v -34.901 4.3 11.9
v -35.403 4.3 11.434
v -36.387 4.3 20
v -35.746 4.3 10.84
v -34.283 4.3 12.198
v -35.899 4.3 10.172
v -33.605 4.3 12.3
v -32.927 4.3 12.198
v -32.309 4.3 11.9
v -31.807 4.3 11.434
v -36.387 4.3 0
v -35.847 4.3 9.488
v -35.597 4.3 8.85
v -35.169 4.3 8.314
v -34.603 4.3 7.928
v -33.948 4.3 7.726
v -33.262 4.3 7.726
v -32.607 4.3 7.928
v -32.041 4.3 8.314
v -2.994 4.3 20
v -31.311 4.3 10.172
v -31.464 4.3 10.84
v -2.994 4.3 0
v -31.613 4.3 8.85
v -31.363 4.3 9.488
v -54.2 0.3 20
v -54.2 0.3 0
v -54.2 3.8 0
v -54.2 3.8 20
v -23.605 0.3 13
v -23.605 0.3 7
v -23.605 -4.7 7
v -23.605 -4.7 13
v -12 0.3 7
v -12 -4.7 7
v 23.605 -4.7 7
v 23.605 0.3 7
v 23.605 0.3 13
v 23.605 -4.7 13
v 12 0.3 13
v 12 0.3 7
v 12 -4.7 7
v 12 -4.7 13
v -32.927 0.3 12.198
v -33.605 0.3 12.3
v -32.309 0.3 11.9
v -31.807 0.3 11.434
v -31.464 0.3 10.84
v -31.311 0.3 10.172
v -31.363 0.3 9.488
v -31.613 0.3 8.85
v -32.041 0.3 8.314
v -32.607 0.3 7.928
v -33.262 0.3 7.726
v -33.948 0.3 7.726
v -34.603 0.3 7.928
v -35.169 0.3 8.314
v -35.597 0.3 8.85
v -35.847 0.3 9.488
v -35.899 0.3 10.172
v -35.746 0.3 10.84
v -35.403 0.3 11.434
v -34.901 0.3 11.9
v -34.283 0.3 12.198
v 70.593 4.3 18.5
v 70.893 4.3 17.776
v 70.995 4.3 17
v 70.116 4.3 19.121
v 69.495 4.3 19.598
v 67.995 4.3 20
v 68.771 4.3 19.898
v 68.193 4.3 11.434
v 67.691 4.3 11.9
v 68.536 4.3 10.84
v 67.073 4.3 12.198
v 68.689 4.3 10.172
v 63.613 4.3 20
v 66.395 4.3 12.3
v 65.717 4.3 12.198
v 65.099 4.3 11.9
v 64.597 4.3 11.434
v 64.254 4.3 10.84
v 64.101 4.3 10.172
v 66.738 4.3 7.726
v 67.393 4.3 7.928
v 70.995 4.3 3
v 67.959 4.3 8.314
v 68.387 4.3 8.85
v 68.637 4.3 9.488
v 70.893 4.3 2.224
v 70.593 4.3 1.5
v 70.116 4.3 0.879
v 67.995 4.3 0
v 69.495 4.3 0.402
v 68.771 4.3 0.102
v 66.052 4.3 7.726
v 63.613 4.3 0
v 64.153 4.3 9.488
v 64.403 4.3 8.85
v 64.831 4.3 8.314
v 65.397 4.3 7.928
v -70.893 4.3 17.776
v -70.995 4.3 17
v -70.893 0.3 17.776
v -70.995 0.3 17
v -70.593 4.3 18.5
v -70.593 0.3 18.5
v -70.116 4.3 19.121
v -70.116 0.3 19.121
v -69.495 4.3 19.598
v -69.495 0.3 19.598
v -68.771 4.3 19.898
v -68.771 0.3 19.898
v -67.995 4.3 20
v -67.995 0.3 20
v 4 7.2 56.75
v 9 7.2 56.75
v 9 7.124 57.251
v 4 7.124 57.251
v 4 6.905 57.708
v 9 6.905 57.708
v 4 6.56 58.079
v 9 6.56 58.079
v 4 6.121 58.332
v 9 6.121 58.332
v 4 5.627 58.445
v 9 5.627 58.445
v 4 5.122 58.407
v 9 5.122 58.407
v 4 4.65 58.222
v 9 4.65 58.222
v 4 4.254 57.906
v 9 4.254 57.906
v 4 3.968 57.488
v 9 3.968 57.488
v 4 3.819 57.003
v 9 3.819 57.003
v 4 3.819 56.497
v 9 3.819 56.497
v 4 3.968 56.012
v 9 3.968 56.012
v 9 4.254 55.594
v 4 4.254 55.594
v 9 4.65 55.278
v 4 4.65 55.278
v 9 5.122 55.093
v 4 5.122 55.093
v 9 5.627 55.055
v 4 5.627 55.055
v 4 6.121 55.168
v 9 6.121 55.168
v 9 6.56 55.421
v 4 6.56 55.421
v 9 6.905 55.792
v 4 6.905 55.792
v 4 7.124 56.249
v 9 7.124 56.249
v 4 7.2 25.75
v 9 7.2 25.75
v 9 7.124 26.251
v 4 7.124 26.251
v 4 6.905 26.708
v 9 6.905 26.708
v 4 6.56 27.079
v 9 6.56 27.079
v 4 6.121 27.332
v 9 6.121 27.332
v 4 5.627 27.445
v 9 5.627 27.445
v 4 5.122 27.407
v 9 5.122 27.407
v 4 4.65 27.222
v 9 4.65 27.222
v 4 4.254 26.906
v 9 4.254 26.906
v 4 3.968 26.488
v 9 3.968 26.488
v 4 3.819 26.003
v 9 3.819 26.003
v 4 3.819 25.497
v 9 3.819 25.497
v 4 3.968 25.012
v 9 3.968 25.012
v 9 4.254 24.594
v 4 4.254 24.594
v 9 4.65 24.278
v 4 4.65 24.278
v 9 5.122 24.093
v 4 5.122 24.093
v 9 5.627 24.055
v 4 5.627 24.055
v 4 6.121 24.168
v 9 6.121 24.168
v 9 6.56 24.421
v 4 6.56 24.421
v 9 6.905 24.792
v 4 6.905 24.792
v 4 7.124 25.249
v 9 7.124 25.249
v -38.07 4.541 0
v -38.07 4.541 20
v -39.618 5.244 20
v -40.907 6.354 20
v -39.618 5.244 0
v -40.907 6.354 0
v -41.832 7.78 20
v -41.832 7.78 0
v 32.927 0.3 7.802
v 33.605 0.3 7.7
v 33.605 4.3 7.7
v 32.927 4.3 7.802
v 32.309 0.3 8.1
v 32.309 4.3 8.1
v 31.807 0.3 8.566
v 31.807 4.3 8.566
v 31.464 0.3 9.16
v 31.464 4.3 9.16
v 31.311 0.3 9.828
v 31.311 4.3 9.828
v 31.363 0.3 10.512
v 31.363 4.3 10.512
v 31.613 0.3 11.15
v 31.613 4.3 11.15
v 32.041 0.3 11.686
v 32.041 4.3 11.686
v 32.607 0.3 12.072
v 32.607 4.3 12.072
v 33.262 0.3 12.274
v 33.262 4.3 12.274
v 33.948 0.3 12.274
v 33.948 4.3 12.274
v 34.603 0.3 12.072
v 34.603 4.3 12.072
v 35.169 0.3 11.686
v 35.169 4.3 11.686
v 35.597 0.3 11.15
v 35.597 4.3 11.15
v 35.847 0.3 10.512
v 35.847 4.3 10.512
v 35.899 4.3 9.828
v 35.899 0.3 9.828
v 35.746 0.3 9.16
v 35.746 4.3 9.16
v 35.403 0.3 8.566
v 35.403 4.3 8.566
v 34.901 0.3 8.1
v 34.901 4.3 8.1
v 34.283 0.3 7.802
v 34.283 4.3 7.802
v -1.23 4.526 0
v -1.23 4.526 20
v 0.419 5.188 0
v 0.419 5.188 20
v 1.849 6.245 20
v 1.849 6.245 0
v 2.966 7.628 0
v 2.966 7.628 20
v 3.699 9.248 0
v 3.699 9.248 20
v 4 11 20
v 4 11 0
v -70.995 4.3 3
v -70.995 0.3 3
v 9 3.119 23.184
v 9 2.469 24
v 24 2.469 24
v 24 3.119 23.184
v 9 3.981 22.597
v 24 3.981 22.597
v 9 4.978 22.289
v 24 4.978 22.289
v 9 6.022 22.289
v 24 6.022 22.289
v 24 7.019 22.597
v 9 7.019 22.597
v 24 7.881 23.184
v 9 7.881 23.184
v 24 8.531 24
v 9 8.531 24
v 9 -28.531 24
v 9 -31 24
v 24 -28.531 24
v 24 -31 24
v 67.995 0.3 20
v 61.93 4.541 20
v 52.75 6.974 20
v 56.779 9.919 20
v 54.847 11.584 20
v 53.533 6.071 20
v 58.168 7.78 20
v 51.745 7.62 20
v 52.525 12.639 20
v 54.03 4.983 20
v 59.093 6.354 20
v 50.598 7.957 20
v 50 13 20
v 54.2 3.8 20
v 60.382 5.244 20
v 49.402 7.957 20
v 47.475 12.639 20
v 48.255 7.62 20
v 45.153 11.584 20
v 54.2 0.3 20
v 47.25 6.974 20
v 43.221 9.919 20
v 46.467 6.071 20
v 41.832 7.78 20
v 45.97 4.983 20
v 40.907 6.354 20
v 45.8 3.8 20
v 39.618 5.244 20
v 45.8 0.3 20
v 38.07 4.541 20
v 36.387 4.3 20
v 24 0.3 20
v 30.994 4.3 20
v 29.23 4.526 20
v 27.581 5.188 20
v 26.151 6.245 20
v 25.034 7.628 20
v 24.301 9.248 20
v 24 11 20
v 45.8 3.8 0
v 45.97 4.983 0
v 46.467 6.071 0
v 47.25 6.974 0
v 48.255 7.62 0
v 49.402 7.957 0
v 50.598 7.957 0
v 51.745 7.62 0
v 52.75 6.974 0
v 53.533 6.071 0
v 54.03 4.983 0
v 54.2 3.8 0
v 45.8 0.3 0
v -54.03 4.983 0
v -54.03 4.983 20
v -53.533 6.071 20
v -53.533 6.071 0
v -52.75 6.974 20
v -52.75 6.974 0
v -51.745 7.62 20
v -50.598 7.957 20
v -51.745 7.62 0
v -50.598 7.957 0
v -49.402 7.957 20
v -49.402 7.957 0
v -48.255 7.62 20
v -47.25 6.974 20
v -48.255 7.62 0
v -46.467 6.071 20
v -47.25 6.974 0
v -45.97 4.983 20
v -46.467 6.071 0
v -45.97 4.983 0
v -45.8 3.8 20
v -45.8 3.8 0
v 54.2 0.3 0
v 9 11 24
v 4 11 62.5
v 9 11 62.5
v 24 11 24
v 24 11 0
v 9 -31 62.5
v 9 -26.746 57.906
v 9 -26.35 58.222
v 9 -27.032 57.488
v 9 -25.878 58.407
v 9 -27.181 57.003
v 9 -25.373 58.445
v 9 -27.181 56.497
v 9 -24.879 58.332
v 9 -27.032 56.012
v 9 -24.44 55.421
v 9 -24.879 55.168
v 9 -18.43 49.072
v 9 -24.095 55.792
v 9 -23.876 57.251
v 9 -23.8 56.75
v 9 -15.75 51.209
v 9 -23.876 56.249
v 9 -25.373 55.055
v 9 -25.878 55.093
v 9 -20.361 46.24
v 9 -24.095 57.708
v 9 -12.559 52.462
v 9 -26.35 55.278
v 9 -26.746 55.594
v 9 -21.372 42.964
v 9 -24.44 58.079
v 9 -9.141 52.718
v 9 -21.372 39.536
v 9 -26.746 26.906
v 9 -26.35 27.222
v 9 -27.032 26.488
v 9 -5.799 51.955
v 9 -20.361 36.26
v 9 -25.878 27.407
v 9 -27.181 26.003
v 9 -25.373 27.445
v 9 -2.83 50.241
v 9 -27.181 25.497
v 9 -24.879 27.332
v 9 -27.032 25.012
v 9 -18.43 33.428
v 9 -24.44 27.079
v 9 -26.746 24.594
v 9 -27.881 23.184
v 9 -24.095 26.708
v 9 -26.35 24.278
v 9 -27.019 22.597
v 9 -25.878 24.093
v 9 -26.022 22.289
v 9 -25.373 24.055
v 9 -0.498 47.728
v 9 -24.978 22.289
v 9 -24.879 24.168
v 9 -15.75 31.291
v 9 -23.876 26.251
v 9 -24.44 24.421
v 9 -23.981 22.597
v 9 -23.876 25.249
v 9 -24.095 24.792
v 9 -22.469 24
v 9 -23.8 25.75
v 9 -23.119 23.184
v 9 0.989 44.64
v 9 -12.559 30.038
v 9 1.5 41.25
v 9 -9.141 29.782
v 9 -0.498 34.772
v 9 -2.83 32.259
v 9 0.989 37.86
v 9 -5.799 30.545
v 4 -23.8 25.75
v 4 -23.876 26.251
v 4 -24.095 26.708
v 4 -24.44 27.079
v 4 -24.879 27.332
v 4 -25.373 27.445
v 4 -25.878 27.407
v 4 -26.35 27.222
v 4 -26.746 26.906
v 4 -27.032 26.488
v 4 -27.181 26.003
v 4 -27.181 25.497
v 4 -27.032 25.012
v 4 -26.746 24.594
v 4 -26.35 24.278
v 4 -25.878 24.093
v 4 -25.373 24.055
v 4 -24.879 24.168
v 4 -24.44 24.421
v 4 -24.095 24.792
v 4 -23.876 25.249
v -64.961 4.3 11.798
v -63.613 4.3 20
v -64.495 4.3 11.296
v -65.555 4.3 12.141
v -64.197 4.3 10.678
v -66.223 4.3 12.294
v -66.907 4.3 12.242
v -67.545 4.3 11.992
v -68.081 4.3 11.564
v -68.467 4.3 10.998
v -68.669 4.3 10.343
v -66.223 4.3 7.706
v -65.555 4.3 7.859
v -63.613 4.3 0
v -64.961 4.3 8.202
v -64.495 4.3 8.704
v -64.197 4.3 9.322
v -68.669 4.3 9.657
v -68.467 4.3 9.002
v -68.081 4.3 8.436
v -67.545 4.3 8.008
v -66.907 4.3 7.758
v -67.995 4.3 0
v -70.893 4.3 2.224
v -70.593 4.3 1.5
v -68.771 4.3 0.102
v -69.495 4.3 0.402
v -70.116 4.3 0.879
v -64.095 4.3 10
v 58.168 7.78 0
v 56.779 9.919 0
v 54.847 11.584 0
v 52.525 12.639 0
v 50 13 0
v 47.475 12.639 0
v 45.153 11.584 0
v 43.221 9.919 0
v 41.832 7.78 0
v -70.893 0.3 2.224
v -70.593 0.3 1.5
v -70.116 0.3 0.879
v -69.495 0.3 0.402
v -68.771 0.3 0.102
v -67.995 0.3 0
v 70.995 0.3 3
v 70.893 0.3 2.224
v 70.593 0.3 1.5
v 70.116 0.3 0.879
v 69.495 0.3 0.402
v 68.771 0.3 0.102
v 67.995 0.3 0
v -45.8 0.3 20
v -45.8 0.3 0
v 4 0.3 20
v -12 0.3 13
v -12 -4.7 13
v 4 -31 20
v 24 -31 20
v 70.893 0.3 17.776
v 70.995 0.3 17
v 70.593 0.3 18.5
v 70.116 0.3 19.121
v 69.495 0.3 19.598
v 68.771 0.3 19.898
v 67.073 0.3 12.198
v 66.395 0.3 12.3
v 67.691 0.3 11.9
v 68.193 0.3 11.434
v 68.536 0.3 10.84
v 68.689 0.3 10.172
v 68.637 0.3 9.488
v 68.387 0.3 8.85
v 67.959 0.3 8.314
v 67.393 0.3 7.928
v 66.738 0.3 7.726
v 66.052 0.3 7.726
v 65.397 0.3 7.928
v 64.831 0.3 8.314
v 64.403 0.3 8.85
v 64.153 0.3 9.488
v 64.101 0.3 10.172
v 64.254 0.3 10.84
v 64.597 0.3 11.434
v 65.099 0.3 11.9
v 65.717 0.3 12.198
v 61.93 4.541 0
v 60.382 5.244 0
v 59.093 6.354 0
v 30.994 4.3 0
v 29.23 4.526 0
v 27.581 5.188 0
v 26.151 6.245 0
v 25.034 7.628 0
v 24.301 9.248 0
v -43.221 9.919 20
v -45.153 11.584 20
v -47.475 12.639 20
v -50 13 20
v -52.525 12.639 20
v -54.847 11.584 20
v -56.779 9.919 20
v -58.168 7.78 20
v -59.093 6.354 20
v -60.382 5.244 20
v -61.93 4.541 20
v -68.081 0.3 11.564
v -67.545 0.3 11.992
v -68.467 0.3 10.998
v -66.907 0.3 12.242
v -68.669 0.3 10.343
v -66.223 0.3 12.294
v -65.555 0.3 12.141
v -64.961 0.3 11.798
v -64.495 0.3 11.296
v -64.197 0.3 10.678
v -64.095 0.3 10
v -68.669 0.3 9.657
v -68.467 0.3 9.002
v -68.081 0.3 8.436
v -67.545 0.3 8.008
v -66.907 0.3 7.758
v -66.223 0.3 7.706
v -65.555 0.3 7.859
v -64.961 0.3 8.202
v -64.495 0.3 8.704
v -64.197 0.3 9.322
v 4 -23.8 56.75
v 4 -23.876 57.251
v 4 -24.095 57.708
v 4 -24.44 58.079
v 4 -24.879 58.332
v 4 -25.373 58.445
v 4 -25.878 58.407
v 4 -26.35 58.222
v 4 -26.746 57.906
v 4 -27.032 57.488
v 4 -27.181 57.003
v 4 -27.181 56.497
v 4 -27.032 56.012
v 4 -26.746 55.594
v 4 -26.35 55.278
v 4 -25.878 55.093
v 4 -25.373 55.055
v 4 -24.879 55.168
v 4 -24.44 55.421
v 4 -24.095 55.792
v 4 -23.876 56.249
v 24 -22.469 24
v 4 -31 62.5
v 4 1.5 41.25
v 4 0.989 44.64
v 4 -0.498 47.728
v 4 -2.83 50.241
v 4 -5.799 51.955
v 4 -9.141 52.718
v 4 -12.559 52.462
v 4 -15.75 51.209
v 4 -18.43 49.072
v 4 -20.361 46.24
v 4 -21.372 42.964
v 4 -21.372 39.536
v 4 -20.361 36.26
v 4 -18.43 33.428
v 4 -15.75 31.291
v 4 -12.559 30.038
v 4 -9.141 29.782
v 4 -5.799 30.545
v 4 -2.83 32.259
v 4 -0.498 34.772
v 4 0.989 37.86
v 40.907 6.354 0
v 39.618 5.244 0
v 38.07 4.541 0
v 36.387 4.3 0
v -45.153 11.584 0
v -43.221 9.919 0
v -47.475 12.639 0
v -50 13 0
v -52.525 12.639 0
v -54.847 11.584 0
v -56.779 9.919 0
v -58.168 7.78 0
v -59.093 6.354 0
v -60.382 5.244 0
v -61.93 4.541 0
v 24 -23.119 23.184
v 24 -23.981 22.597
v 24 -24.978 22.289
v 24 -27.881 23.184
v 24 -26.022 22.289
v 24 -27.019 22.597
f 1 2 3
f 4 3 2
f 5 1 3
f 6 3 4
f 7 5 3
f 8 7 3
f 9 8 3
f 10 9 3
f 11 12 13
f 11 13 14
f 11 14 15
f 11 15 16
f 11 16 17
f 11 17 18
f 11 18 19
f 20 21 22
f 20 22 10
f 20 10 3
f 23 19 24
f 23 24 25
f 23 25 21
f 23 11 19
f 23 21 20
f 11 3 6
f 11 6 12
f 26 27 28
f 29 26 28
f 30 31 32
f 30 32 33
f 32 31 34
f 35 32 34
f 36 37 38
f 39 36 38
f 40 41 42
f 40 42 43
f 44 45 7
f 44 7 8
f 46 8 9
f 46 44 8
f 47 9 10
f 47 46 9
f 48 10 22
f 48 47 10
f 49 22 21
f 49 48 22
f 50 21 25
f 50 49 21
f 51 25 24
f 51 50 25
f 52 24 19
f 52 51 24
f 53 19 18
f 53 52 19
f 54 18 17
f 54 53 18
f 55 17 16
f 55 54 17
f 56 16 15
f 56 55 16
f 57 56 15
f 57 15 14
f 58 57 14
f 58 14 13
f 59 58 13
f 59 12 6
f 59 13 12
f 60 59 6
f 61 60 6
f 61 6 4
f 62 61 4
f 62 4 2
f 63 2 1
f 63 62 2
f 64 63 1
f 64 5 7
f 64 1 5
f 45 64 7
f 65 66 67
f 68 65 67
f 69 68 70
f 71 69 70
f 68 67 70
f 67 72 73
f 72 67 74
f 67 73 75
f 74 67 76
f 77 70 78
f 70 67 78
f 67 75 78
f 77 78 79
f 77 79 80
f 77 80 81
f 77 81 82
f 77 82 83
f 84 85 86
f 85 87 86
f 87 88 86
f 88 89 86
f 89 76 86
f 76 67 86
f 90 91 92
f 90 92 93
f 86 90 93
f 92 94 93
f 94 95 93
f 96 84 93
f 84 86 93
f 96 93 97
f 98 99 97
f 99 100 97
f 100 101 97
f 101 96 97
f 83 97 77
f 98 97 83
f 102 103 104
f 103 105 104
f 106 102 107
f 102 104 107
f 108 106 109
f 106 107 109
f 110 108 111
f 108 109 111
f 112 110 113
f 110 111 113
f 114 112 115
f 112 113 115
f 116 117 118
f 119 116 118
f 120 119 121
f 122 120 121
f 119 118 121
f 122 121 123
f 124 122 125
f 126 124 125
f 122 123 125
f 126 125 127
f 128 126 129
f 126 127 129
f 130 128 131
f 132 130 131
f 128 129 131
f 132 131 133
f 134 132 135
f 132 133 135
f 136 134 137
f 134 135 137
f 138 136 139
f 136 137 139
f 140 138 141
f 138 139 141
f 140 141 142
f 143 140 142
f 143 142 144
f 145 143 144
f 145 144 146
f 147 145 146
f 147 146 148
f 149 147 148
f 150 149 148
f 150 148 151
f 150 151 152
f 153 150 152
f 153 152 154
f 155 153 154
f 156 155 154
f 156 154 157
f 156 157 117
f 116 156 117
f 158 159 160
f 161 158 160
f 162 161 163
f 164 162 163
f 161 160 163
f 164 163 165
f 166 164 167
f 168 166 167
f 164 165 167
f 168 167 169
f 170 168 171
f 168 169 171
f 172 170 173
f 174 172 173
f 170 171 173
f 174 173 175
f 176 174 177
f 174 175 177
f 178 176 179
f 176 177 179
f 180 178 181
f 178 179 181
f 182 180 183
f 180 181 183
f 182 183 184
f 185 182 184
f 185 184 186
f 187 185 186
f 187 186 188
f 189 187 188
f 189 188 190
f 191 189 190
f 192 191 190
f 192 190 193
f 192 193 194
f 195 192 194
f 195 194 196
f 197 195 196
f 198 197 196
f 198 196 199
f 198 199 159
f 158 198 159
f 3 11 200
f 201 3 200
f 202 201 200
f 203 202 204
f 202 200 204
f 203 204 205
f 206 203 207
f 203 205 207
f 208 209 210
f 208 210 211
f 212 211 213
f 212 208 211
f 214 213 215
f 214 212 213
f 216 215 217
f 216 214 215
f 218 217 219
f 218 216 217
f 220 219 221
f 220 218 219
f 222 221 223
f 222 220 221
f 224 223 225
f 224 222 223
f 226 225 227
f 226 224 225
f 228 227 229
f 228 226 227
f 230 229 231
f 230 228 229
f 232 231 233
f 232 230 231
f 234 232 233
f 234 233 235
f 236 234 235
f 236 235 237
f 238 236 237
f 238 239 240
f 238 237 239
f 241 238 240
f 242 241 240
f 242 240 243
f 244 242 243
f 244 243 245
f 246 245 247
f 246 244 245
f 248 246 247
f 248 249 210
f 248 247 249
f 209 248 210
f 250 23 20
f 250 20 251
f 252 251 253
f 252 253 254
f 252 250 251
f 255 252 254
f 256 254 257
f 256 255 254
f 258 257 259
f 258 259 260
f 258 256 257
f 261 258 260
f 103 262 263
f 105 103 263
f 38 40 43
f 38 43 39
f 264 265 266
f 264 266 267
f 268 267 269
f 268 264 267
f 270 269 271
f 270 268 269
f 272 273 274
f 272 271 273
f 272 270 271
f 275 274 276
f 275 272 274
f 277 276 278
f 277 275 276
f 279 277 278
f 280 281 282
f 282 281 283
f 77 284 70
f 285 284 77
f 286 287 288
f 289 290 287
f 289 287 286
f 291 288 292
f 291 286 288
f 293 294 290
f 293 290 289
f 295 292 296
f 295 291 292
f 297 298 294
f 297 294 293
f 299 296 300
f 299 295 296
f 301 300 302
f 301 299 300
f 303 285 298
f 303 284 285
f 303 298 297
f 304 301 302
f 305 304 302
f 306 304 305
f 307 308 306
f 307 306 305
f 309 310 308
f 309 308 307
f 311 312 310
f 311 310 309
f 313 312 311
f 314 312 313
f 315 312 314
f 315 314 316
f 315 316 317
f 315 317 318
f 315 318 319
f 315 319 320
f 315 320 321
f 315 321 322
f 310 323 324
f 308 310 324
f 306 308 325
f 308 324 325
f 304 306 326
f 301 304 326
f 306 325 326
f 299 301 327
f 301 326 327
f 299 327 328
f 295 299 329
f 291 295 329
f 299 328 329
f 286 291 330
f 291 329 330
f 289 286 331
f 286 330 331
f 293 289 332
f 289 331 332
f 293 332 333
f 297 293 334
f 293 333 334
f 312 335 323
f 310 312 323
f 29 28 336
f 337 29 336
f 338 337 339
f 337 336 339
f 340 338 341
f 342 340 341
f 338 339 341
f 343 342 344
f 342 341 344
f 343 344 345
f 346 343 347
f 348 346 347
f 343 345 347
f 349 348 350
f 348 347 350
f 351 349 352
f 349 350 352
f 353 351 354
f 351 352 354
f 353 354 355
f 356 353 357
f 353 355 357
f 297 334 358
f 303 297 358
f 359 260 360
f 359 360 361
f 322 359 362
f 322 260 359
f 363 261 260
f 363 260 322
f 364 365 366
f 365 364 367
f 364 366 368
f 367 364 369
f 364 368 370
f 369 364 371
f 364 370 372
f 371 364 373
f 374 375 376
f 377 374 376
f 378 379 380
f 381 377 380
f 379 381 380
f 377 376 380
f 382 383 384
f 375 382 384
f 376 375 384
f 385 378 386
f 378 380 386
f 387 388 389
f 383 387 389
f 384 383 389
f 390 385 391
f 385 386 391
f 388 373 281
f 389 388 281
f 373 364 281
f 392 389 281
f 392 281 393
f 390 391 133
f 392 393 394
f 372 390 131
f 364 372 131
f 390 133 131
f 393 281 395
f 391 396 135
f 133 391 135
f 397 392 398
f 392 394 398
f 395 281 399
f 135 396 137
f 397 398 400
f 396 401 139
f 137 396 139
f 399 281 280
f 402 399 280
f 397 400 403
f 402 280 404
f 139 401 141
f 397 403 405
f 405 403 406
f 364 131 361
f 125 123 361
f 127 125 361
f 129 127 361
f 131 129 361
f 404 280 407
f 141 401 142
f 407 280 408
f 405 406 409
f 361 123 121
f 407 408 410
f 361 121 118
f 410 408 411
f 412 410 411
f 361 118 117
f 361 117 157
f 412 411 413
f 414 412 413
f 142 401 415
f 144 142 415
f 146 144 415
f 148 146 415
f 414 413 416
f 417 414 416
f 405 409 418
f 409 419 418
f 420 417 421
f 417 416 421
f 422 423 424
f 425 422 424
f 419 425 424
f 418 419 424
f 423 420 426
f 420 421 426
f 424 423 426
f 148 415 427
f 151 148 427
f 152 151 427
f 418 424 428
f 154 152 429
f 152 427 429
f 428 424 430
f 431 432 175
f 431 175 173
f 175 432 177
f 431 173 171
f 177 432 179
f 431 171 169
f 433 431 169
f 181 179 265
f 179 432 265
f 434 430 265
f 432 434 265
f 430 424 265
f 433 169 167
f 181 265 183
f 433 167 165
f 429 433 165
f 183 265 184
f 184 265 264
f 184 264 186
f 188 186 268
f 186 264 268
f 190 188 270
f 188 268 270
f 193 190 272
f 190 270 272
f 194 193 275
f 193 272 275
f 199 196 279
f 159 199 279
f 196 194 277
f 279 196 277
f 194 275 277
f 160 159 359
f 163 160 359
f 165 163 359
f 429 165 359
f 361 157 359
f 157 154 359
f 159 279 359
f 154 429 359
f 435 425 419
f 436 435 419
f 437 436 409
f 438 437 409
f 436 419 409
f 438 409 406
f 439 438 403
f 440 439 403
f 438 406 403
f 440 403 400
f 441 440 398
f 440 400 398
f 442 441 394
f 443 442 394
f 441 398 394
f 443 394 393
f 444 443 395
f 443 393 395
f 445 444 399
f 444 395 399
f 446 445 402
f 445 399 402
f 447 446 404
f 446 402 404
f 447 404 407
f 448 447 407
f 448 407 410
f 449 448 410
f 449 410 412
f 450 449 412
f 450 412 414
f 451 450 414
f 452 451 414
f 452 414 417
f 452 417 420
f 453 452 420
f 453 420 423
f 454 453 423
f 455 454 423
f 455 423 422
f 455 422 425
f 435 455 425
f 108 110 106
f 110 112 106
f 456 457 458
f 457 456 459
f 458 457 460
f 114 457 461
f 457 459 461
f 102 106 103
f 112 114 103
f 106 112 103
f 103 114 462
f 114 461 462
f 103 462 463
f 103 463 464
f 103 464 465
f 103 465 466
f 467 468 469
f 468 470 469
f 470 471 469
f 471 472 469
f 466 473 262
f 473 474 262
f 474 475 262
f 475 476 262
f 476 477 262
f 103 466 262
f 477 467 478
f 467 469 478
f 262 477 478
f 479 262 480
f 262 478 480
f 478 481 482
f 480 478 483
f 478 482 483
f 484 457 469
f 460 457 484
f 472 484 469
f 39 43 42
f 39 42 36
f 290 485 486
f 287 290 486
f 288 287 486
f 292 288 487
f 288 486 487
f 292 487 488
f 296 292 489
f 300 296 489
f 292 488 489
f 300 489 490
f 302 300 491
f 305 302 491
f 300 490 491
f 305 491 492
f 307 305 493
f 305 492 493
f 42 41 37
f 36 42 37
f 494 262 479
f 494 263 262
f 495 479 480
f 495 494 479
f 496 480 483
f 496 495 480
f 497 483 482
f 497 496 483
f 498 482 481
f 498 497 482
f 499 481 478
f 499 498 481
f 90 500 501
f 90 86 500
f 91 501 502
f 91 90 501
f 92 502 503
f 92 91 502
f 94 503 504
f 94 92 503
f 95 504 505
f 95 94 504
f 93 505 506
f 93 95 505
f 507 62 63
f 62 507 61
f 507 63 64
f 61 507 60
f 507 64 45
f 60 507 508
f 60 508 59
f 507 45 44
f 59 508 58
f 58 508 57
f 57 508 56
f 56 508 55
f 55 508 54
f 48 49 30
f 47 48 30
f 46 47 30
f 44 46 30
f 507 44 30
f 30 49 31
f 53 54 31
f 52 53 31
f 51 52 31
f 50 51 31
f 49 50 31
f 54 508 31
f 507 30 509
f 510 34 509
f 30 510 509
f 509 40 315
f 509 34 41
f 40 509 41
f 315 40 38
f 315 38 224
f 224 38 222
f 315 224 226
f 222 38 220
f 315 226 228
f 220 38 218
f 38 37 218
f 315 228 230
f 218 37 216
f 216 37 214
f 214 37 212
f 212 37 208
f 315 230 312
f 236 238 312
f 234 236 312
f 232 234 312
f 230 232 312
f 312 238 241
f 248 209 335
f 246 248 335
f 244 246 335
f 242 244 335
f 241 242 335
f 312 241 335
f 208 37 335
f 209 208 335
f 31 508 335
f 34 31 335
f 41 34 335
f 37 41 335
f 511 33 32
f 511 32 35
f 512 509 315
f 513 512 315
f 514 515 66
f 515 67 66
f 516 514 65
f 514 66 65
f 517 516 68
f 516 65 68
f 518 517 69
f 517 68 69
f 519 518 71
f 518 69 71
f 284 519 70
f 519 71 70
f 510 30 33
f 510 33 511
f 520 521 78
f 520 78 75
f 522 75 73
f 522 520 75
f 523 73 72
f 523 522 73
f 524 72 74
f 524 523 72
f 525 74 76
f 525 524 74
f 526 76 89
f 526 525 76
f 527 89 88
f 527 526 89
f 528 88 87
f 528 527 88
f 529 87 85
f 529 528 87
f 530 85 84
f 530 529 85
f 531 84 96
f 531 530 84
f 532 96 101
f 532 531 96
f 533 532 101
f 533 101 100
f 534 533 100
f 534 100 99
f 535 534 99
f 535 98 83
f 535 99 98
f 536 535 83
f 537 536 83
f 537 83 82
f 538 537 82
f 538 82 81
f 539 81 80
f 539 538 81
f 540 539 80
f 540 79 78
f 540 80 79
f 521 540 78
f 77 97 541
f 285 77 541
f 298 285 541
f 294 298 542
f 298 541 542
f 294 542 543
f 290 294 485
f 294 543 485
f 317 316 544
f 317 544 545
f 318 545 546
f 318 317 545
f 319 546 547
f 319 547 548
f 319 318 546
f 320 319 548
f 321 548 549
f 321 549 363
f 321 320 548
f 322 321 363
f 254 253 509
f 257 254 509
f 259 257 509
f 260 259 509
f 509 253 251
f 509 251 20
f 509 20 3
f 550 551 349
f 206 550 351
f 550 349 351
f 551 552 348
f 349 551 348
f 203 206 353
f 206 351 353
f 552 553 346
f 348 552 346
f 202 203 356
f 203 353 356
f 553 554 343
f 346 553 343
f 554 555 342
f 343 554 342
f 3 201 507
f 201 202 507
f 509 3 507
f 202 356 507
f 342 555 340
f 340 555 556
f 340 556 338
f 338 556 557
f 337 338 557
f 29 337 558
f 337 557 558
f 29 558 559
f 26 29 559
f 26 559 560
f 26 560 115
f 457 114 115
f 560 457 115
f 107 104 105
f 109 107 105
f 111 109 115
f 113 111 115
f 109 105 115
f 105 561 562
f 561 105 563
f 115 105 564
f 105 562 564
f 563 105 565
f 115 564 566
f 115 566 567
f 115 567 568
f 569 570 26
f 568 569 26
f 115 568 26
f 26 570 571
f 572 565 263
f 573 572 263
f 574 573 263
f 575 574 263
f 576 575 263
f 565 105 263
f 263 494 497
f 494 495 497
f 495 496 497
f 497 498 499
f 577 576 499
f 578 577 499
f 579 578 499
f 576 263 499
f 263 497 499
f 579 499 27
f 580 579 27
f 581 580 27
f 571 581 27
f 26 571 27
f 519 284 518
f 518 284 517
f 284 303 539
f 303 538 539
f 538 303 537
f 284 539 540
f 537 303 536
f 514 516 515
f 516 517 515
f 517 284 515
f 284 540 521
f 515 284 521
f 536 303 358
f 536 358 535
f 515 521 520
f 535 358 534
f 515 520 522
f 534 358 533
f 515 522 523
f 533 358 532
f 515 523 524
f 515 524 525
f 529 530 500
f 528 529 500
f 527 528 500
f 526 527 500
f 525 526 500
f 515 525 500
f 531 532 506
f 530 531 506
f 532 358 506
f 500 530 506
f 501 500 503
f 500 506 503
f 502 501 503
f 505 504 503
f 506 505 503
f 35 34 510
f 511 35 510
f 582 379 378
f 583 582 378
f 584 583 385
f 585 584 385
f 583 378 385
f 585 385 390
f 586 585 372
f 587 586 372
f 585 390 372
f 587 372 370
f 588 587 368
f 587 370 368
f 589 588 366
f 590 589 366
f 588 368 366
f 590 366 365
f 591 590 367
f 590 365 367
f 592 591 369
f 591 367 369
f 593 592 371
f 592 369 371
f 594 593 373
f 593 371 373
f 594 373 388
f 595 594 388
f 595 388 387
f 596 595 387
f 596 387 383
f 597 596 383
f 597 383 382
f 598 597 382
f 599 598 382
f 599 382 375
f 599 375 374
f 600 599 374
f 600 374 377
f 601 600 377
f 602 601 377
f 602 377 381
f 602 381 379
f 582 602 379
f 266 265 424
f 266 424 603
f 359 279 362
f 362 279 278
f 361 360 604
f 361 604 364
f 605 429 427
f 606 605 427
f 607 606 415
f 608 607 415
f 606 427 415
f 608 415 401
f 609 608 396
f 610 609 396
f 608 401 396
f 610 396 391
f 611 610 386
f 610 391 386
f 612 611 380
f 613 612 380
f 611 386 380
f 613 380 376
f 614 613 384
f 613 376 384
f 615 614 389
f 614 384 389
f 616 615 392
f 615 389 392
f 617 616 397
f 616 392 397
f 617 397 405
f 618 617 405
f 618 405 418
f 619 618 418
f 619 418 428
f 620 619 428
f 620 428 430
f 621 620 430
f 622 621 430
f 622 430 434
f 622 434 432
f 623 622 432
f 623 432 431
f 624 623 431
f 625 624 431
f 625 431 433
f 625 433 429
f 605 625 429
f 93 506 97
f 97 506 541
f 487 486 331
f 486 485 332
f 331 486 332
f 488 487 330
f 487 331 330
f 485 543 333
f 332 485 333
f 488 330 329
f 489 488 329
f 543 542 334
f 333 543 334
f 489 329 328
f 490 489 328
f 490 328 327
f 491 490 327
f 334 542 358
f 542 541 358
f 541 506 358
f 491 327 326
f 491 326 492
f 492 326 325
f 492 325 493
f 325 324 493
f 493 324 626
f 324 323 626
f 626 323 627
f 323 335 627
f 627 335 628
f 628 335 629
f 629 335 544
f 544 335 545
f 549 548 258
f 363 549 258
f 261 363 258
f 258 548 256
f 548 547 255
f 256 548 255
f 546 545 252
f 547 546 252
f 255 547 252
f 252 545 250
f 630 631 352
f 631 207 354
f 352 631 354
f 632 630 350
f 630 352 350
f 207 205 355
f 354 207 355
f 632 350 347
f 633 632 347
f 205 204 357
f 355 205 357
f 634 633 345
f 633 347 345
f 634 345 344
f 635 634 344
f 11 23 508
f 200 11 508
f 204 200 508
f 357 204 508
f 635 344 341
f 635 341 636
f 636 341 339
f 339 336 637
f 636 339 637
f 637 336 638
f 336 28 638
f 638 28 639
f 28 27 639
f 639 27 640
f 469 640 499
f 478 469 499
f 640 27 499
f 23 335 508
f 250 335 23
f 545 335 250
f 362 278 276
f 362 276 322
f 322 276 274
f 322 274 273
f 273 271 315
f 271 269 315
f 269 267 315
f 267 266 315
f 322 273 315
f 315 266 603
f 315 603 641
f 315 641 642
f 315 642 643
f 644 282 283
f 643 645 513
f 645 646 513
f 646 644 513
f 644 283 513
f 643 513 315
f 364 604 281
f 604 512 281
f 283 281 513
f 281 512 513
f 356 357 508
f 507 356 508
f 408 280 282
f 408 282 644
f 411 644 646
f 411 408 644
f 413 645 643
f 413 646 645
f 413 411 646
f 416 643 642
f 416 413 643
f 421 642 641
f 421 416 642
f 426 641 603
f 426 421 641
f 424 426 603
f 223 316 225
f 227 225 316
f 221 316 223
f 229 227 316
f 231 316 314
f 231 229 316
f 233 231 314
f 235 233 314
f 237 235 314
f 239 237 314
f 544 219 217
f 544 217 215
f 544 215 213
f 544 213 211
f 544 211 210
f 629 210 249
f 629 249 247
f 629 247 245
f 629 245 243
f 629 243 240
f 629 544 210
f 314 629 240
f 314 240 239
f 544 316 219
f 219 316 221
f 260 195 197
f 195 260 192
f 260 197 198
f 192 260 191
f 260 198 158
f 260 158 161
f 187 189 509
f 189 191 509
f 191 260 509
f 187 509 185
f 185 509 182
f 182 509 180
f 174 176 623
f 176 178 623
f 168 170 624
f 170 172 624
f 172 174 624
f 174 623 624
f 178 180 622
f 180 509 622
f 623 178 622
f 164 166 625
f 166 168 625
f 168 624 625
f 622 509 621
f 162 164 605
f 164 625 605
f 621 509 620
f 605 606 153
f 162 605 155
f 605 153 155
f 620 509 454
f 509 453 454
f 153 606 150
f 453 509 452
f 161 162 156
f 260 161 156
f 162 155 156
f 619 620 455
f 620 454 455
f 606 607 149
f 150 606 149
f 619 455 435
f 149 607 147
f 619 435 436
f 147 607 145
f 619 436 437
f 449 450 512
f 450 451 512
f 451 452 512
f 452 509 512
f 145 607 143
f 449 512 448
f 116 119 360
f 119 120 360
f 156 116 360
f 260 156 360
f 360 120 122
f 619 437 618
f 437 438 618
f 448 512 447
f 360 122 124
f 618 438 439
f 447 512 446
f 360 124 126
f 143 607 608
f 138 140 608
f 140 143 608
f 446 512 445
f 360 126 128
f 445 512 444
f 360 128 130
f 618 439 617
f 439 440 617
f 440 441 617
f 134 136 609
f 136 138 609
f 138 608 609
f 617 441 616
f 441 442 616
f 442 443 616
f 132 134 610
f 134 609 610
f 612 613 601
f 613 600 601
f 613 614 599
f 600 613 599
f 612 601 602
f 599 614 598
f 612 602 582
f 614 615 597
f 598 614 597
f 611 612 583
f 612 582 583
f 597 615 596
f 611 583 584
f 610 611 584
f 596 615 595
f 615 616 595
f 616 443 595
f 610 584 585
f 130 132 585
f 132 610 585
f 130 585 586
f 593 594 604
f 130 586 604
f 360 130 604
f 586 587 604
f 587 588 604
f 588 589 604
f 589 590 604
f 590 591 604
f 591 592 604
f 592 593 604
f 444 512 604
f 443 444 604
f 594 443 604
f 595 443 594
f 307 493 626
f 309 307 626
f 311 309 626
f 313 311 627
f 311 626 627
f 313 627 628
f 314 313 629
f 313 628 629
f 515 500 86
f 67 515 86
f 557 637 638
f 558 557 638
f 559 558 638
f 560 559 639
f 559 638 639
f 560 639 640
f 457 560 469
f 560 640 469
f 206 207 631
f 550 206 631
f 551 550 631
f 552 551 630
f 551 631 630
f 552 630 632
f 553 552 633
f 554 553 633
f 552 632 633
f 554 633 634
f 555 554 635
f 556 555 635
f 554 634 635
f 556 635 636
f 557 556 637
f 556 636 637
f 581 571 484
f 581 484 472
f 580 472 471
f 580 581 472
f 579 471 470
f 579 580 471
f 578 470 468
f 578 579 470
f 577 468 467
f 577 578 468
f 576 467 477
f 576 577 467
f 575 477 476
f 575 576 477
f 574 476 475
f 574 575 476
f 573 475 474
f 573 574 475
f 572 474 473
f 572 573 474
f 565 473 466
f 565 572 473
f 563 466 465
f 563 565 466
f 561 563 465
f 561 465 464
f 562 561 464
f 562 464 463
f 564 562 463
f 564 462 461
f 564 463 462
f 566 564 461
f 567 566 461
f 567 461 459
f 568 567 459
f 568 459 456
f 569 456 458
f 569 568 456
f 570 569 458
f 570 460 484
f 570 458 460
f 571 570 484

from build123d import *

# Parameters (mm, degrees)
EXTRUDE_1_DEPTH          = 20
FILLET_1_R               = 3
CUT_EXTRUDE_1_DEPTH      = 75.269642706
CUT_EXTRUDE_1_DEPTH_BACK = 75.269642706
SKETCH_2_R               = 2.3
SKETCH_3_W               = 20
SKETCH_3_H               = 35.3
EXTRUDE_2_DEPTH          = 4
SKETCH_4_W               = 5
SKETCH_4_H               = 42
EXTRUDE_3_DEPTH          = 38.5
EXTRUDE_4_DEPTH          = 6.7
CUT_EXTRUDE_2_REACH      = 119.861
SKETCH_6_R               = 11.5
SKETCH_6_R_2             = 1.7
FILLET_2_R               = 7
CUT_EXTRUDE_3_REACH      = 108.144
SKETCH_9_R               = 3.5
SKETCH_10_W              = 11.60500139
SKETCH_10_H              = 6
EXTRUDE_6_DEPTH          = 5


with BuildPart() as part:
    # 草图1 → 凸台-拉伸1 (new body)
    with BuildSketch(Plane.XY):
        with BuildLine():
            Line((54.2, 3.8), (54.2, 0.3))
            Line((54.2, 0.3), (70.99499861, 0.3))
            Line((70.99499861, 0.3), (70.99499861, 4.3))
            Line((70.99499861, 4.3), (63.612861565, 4.3))
            ThreePointArc((63.612861565, 4.3), (60.381762681, 5.244310136), (58.167716939, 7.78))
            ThreePointArc((58.167716939, 7.78), (50, 13), (41.832283061, 7.78))
            ThreePointArc((41.832283061, 7.78), (39.618237319, 5.244310136), (36.387138435, 4.3))
            Line((36.387138435, 4.3), (-36.387138435, 4.3))
            ThreePointArc((-36.387138435, 4.3), (-39.618237319, 5.244310136), (-41.832283061, 7.78))
            ThreePointArc((-41.832283061, 7.78), (-50, 13), (-58.167716939, 7.78))
            ThreePointArc((-58.167716939, 7.78), (-60.381762681, 5.244310136), (-63.612861565, 4.3))
            Line((-63.612861565, 4.3), (-70.99499861, 4.3))
            Line((-70.99499861, 4.3), (-70.99499861, 0.3))
            Line((-70.99499861, 0.3), (-54.2, 0.3))
            Line((-54.2, 0.3), (-54.2, 3.8))
            ThreePointArc((-54.2, 3.8), (-50, 8), (-45.8, 3.8))
            Line((-45.8, 3.8), (-45.8, 0.3))
            Line((-45.8, 0.3), (45.8, 0.3))
            Line((45.8, 0.3), (45.8, 3.8))
            ThreePointArc((45.8, 3.8), (50, 8), (54.2, 3.8))
        make_face()
    extrude(amount=EXTRUDE_1_DEPTH)

    # 圆角1
    fillet_1_edges = [part.edges().sort_by_distance(p)[0] for p in [
        (70.99499861, 2.3, 20),
        (-70.99499861, 2.3, 0),
        (70.99499861, 2.3, 0),
        (-70.99499861, 2.3, 20),
    ]]
    fillet(fillet_1_edges, radius=FILLET_1_R)

    # 草图2 → 切除-拉伸1 (cut, two sides: drawn at the far end of the back side and taken through both)
    with BuildSketch(Plane(origin=(0, 4.3, 0), x_dir=(1, 0, 0), z_dir=(0, 1, 0)).offset(-CUT_EXTRUDE_1_DEPTH_BACK)):
        with Locations(Location((66.39499861, -10, 0), (0, 0, 270))):
            Circle(SKETCH_2_R)
        with Locations(Location((33.60500139, -10, 0), (0, 0, 90))):
            Circle(SKETCH_2_R)
        with Locations(Location((-33.60500139, -10, 0), (0, 0, 270))):
            Circle(SKETCH_2_R)
        with Locations((-66.39499861, -10)):
            Circle(SKETCH_2_R)
    extrude(amount=CUT_EXTRUDE_1_DEPTH + CUT_EXTRUDE_1_DEPTH_BACK, mode=Mode.SUBTRACT)

    # 草图3 → 凸台-拉伸2 (add)
    with BuildSketch(Plane.XY.offset(20)):
        with Locations((14, -13.35)):
            Rectangle(SKETCH_3_W, SKETCH_3_H)
    extrude(amount=EXTRUDE_2_DEPTH)

    # 草图4 → 凸台-拉伸3 (add)
    with BuildSketch(Plane.XY.offset(24)):
        with Locations((6.5, -10)):
            Rectangle(SKETCH_4_W, SKETCH_4_H)
    extrude(amount=EXTRUDE_3_DEPTH)

    # 草图5 → 凸台-拉伸4 (add)
    with BuildSketch(Plane(origin=(0, 4.3, 0), x_dir=(1, 0, 0), z_dir=(0, 1, 0))):
        Polygon((4, -13), (4, -24), (24, -24), (24, 0), (4, 0), align=None)
    extrude(amount=EXTRUDE_4_DEPTH)

    # 草图6 → 切除-拉伸2 (cut, up to next)
    with BuildSketch(Plane(origin=(24, 0, 0), x_dir=(0, 0, -1), z_dir=(1, 0, 0)), mode=Mode.PRIVATE) as cut_extrude_2_sk1:
        with Locations(Location((-41.25, -10, 0), (0, 0, 90))):
            Circle(SKETCH_6_R)
    cut_extrude_2_tool1 = extrude(cut_extrude_2_sk1.sketch, amount=-CUT_EXTRUDE_2_REACH, mode=Mode.PRIVATE) & part.part
    # 草图6 → 切除-拉伸2 (cut, up to next)
    with BuildSketch(Plane(origin=(24, 0, 0), x_dir=(0, 0, -1), z_dir=(1, 0, 0)), mode=Mode.PRIVATE) as cut_extrude_2_sk2:
        with Locations(Location((-25.75, 5.5, 0), (0, 0, 90))):
            Circle(SKETCH_6_R_2)
    cut_extrude_2_tool2 = extrude(cut_extrude_2_sk2.sketch, amount=-CUT_EXTRUDE_2_REACH, mode=Mode.PRIVATE) & part.part
    # 草图6 → 切除-拉伸2 (cut, up to next)
    with BuildSketch(Plane(origin=(24, 0, 0), x_dir=(0, 0, -1), z_dir=(1, 0, 0)), mode=Mode.PRIVATE) as cut_extrude_2_sk3:
        with Locations(Location((-25.75, -25.5, 0), (0, 0, 90))):
            Circle(SKETCH_6_R_2)
    cut_extrude_2_tool3 = extrude(cut_extrude_2_sk3.sketch, amount=-CUT_EXTRUDE_2_REACH, mode=Mode.PRIVATE) & part.part
    # 草图6 → 切除-拉伸2 (cut, up to next)
    with BuildSketch(Plane(origin=(24, 0, 0), x_dir=(0, 0, -1), z_dir=(1, 0, 0)), mode=Mode.PRIVATE) as cut_extrude_2_sk4:
        with Locations(Location((-56.75, -25.5, 0), (0, 0, 90))):
            Circle(SKETCH_6_R_2)
    cut_extrude_2_tool4 = extrude(cut_extrude_2_sk4.sketch, amount=-CUT_EXTRUDE_2_REACH, mode=Mode.PRIVATE) & part.part
    # 草图6 → 切除-拉伸2 (cut, up to next)
    with BuildSketch(Plane(origin=(24, 0, 0), x_dir=(0, 0, -1), z_dir=(1, 0, 0)), mode=Mode.PRIVATE) as cut_extrude_2_sk5:
        with Locations(Location((-56.75, 5.5, 0), (0, 0, 90))):
            Circle(SKETCH_6_R_2)
    cut_extrude_2_tool5 = extrude(cut_extrude_2_sk5.sketch, amount=-CUT_EXTRUDE_2_REACH, mode=Mode.PRIVATE) & part.part
    add(cut_extrude_2_tool1.solids().sort_by_distance((24, -10, 41.25))[0], mode=Mode.SUBTRACT)
    add(cut_extrude_2_tool2.solids().sort_by_distance((24, 5.5, 25.75))[0], mode=Mode.SUBTRACT)
    add(cut_extrude_2_tool3.solids().sort_by_distance((24, -25.5, 25.75))[0], mode=Mode.SUBTRACT)
    add(cut_extrude_2_tool4.solids().sort_by_distance((24, -25.5, 56.75))[0], mode=Mode.SUBTRACT)
    add(cut_extrude_2_tool5.solids().sort_by_distance((24, 5.5, 56.75))[0], mode=Mode.SUBTRACT)

    # 圆角2
    # the kernel refuses this fillet: 7 mm, written as the material it adds along each edge
    with BuildSketch(Plane(origin=(4, 4.3, 0), x_dir=(0, 1, 0), z_dir=(0, 0, 1))) as fillet_2_piece_1:
        with BuildLine():
            CenterArc((7, 6.993568474), FILLET_2_R, 180, 87.543714276)
            Line((0, 6.993568474), (-0.14, 6.993568474))
            Line((-0.14, 6.993568474), (-0.14, 0))
            Line((-0.14, 0), (0, -0.14))
            ThreePointArc((0, -0.14), (3.35, -0.14), (6.694, -0.139871369))
            Line((6.694, -0.139871369), (6.7, 0))
        make_face()
    extrude(amount=20)
    with BuildSketch(Plane(origin=(24, 4.3, 20), x_dir=(1, 0, 0), z_dir=(0, 0, -1))) as fillet_2_piece_2:
        with BuildLine():
            CenterArc((6.993568474, -7), FILLET_2_R, 90, 87.543714276)
            Line((0, -6.7), (-0.139871369, -6.694))
            ThreePointArc((-0.139871369, -6.694), (-0.14, -3.35), (-0.14, 0))
            Line((-0.14, 0), (0, 0.14))
            Line((0, 0.14), (6.993568474, 0.14))
            Line((6.993568474, 0.14), (6.993568474, 0))
        make_face()
    extrude(amount=20)

    # 草图9 → 切除-拉伸3 (cut, up to next)
    with BuildSketch(Plane(origin=(9, 0, 0), x_dir=(0, 0, -1), z_dir=(1, 0, 0)), mode=Mode.PRIVATE) as cut_extrude_3_sk1:
        with Locations((-25.75, 5.5)):
            Circle(SKETCH_9_R)
    cut_extrude_3_tool1 = extrude(cut_extrude_3_sk1.sketch, amount=CUT_EXTRUDE_3_REACH, mode=Mode.PRIVATE) & part.part
    # 草图9 → 切除-拉伸3 (cut, up to next)
    with BuildSketch(Plane(origin=(9, 0, 0), x_dir=(0, 0, -1), z_dir=(1, 0, 0)), mode=Mode.PRIVATE) as cut_extrude_3_sk2:
        with Locations((-25.75, -25.5)):
            Circle(SKETCH_9_R)
    cut_extrude_3_tool2 = extrude(cut_extrude_3_sk2.sketch, amount=CUT_EXTRUDE_3_REACH, mode=Mode.PRIVATE) & part.part
    add(cut_extrude_3_tool1.solids().sort_by_distance((9, 5.5, 25.75))[0], mode=Mode.SUBTRACT)
    add(cut_extrude_3_tool2.solids().sort_by_distance((9, -25.5, 25.75))[0], mode=Mode.SUBTRACT)

    # 草图10 → 凸台-拉伸6 (add)
    with BuildSketch(Plane.XZ.offset(-0.3)):
        with Locations((17.802500695, 10)):
            Rectangle(SKETCH_10_W, SKETCH_10_H)
        with Locations((-17.802500695, 10)):
            Rectangle(SKETCH_10_W, SKETCH_10_H)
    extrude(amount=EXTRUDE_6_DEPTH)


solid = part.part
